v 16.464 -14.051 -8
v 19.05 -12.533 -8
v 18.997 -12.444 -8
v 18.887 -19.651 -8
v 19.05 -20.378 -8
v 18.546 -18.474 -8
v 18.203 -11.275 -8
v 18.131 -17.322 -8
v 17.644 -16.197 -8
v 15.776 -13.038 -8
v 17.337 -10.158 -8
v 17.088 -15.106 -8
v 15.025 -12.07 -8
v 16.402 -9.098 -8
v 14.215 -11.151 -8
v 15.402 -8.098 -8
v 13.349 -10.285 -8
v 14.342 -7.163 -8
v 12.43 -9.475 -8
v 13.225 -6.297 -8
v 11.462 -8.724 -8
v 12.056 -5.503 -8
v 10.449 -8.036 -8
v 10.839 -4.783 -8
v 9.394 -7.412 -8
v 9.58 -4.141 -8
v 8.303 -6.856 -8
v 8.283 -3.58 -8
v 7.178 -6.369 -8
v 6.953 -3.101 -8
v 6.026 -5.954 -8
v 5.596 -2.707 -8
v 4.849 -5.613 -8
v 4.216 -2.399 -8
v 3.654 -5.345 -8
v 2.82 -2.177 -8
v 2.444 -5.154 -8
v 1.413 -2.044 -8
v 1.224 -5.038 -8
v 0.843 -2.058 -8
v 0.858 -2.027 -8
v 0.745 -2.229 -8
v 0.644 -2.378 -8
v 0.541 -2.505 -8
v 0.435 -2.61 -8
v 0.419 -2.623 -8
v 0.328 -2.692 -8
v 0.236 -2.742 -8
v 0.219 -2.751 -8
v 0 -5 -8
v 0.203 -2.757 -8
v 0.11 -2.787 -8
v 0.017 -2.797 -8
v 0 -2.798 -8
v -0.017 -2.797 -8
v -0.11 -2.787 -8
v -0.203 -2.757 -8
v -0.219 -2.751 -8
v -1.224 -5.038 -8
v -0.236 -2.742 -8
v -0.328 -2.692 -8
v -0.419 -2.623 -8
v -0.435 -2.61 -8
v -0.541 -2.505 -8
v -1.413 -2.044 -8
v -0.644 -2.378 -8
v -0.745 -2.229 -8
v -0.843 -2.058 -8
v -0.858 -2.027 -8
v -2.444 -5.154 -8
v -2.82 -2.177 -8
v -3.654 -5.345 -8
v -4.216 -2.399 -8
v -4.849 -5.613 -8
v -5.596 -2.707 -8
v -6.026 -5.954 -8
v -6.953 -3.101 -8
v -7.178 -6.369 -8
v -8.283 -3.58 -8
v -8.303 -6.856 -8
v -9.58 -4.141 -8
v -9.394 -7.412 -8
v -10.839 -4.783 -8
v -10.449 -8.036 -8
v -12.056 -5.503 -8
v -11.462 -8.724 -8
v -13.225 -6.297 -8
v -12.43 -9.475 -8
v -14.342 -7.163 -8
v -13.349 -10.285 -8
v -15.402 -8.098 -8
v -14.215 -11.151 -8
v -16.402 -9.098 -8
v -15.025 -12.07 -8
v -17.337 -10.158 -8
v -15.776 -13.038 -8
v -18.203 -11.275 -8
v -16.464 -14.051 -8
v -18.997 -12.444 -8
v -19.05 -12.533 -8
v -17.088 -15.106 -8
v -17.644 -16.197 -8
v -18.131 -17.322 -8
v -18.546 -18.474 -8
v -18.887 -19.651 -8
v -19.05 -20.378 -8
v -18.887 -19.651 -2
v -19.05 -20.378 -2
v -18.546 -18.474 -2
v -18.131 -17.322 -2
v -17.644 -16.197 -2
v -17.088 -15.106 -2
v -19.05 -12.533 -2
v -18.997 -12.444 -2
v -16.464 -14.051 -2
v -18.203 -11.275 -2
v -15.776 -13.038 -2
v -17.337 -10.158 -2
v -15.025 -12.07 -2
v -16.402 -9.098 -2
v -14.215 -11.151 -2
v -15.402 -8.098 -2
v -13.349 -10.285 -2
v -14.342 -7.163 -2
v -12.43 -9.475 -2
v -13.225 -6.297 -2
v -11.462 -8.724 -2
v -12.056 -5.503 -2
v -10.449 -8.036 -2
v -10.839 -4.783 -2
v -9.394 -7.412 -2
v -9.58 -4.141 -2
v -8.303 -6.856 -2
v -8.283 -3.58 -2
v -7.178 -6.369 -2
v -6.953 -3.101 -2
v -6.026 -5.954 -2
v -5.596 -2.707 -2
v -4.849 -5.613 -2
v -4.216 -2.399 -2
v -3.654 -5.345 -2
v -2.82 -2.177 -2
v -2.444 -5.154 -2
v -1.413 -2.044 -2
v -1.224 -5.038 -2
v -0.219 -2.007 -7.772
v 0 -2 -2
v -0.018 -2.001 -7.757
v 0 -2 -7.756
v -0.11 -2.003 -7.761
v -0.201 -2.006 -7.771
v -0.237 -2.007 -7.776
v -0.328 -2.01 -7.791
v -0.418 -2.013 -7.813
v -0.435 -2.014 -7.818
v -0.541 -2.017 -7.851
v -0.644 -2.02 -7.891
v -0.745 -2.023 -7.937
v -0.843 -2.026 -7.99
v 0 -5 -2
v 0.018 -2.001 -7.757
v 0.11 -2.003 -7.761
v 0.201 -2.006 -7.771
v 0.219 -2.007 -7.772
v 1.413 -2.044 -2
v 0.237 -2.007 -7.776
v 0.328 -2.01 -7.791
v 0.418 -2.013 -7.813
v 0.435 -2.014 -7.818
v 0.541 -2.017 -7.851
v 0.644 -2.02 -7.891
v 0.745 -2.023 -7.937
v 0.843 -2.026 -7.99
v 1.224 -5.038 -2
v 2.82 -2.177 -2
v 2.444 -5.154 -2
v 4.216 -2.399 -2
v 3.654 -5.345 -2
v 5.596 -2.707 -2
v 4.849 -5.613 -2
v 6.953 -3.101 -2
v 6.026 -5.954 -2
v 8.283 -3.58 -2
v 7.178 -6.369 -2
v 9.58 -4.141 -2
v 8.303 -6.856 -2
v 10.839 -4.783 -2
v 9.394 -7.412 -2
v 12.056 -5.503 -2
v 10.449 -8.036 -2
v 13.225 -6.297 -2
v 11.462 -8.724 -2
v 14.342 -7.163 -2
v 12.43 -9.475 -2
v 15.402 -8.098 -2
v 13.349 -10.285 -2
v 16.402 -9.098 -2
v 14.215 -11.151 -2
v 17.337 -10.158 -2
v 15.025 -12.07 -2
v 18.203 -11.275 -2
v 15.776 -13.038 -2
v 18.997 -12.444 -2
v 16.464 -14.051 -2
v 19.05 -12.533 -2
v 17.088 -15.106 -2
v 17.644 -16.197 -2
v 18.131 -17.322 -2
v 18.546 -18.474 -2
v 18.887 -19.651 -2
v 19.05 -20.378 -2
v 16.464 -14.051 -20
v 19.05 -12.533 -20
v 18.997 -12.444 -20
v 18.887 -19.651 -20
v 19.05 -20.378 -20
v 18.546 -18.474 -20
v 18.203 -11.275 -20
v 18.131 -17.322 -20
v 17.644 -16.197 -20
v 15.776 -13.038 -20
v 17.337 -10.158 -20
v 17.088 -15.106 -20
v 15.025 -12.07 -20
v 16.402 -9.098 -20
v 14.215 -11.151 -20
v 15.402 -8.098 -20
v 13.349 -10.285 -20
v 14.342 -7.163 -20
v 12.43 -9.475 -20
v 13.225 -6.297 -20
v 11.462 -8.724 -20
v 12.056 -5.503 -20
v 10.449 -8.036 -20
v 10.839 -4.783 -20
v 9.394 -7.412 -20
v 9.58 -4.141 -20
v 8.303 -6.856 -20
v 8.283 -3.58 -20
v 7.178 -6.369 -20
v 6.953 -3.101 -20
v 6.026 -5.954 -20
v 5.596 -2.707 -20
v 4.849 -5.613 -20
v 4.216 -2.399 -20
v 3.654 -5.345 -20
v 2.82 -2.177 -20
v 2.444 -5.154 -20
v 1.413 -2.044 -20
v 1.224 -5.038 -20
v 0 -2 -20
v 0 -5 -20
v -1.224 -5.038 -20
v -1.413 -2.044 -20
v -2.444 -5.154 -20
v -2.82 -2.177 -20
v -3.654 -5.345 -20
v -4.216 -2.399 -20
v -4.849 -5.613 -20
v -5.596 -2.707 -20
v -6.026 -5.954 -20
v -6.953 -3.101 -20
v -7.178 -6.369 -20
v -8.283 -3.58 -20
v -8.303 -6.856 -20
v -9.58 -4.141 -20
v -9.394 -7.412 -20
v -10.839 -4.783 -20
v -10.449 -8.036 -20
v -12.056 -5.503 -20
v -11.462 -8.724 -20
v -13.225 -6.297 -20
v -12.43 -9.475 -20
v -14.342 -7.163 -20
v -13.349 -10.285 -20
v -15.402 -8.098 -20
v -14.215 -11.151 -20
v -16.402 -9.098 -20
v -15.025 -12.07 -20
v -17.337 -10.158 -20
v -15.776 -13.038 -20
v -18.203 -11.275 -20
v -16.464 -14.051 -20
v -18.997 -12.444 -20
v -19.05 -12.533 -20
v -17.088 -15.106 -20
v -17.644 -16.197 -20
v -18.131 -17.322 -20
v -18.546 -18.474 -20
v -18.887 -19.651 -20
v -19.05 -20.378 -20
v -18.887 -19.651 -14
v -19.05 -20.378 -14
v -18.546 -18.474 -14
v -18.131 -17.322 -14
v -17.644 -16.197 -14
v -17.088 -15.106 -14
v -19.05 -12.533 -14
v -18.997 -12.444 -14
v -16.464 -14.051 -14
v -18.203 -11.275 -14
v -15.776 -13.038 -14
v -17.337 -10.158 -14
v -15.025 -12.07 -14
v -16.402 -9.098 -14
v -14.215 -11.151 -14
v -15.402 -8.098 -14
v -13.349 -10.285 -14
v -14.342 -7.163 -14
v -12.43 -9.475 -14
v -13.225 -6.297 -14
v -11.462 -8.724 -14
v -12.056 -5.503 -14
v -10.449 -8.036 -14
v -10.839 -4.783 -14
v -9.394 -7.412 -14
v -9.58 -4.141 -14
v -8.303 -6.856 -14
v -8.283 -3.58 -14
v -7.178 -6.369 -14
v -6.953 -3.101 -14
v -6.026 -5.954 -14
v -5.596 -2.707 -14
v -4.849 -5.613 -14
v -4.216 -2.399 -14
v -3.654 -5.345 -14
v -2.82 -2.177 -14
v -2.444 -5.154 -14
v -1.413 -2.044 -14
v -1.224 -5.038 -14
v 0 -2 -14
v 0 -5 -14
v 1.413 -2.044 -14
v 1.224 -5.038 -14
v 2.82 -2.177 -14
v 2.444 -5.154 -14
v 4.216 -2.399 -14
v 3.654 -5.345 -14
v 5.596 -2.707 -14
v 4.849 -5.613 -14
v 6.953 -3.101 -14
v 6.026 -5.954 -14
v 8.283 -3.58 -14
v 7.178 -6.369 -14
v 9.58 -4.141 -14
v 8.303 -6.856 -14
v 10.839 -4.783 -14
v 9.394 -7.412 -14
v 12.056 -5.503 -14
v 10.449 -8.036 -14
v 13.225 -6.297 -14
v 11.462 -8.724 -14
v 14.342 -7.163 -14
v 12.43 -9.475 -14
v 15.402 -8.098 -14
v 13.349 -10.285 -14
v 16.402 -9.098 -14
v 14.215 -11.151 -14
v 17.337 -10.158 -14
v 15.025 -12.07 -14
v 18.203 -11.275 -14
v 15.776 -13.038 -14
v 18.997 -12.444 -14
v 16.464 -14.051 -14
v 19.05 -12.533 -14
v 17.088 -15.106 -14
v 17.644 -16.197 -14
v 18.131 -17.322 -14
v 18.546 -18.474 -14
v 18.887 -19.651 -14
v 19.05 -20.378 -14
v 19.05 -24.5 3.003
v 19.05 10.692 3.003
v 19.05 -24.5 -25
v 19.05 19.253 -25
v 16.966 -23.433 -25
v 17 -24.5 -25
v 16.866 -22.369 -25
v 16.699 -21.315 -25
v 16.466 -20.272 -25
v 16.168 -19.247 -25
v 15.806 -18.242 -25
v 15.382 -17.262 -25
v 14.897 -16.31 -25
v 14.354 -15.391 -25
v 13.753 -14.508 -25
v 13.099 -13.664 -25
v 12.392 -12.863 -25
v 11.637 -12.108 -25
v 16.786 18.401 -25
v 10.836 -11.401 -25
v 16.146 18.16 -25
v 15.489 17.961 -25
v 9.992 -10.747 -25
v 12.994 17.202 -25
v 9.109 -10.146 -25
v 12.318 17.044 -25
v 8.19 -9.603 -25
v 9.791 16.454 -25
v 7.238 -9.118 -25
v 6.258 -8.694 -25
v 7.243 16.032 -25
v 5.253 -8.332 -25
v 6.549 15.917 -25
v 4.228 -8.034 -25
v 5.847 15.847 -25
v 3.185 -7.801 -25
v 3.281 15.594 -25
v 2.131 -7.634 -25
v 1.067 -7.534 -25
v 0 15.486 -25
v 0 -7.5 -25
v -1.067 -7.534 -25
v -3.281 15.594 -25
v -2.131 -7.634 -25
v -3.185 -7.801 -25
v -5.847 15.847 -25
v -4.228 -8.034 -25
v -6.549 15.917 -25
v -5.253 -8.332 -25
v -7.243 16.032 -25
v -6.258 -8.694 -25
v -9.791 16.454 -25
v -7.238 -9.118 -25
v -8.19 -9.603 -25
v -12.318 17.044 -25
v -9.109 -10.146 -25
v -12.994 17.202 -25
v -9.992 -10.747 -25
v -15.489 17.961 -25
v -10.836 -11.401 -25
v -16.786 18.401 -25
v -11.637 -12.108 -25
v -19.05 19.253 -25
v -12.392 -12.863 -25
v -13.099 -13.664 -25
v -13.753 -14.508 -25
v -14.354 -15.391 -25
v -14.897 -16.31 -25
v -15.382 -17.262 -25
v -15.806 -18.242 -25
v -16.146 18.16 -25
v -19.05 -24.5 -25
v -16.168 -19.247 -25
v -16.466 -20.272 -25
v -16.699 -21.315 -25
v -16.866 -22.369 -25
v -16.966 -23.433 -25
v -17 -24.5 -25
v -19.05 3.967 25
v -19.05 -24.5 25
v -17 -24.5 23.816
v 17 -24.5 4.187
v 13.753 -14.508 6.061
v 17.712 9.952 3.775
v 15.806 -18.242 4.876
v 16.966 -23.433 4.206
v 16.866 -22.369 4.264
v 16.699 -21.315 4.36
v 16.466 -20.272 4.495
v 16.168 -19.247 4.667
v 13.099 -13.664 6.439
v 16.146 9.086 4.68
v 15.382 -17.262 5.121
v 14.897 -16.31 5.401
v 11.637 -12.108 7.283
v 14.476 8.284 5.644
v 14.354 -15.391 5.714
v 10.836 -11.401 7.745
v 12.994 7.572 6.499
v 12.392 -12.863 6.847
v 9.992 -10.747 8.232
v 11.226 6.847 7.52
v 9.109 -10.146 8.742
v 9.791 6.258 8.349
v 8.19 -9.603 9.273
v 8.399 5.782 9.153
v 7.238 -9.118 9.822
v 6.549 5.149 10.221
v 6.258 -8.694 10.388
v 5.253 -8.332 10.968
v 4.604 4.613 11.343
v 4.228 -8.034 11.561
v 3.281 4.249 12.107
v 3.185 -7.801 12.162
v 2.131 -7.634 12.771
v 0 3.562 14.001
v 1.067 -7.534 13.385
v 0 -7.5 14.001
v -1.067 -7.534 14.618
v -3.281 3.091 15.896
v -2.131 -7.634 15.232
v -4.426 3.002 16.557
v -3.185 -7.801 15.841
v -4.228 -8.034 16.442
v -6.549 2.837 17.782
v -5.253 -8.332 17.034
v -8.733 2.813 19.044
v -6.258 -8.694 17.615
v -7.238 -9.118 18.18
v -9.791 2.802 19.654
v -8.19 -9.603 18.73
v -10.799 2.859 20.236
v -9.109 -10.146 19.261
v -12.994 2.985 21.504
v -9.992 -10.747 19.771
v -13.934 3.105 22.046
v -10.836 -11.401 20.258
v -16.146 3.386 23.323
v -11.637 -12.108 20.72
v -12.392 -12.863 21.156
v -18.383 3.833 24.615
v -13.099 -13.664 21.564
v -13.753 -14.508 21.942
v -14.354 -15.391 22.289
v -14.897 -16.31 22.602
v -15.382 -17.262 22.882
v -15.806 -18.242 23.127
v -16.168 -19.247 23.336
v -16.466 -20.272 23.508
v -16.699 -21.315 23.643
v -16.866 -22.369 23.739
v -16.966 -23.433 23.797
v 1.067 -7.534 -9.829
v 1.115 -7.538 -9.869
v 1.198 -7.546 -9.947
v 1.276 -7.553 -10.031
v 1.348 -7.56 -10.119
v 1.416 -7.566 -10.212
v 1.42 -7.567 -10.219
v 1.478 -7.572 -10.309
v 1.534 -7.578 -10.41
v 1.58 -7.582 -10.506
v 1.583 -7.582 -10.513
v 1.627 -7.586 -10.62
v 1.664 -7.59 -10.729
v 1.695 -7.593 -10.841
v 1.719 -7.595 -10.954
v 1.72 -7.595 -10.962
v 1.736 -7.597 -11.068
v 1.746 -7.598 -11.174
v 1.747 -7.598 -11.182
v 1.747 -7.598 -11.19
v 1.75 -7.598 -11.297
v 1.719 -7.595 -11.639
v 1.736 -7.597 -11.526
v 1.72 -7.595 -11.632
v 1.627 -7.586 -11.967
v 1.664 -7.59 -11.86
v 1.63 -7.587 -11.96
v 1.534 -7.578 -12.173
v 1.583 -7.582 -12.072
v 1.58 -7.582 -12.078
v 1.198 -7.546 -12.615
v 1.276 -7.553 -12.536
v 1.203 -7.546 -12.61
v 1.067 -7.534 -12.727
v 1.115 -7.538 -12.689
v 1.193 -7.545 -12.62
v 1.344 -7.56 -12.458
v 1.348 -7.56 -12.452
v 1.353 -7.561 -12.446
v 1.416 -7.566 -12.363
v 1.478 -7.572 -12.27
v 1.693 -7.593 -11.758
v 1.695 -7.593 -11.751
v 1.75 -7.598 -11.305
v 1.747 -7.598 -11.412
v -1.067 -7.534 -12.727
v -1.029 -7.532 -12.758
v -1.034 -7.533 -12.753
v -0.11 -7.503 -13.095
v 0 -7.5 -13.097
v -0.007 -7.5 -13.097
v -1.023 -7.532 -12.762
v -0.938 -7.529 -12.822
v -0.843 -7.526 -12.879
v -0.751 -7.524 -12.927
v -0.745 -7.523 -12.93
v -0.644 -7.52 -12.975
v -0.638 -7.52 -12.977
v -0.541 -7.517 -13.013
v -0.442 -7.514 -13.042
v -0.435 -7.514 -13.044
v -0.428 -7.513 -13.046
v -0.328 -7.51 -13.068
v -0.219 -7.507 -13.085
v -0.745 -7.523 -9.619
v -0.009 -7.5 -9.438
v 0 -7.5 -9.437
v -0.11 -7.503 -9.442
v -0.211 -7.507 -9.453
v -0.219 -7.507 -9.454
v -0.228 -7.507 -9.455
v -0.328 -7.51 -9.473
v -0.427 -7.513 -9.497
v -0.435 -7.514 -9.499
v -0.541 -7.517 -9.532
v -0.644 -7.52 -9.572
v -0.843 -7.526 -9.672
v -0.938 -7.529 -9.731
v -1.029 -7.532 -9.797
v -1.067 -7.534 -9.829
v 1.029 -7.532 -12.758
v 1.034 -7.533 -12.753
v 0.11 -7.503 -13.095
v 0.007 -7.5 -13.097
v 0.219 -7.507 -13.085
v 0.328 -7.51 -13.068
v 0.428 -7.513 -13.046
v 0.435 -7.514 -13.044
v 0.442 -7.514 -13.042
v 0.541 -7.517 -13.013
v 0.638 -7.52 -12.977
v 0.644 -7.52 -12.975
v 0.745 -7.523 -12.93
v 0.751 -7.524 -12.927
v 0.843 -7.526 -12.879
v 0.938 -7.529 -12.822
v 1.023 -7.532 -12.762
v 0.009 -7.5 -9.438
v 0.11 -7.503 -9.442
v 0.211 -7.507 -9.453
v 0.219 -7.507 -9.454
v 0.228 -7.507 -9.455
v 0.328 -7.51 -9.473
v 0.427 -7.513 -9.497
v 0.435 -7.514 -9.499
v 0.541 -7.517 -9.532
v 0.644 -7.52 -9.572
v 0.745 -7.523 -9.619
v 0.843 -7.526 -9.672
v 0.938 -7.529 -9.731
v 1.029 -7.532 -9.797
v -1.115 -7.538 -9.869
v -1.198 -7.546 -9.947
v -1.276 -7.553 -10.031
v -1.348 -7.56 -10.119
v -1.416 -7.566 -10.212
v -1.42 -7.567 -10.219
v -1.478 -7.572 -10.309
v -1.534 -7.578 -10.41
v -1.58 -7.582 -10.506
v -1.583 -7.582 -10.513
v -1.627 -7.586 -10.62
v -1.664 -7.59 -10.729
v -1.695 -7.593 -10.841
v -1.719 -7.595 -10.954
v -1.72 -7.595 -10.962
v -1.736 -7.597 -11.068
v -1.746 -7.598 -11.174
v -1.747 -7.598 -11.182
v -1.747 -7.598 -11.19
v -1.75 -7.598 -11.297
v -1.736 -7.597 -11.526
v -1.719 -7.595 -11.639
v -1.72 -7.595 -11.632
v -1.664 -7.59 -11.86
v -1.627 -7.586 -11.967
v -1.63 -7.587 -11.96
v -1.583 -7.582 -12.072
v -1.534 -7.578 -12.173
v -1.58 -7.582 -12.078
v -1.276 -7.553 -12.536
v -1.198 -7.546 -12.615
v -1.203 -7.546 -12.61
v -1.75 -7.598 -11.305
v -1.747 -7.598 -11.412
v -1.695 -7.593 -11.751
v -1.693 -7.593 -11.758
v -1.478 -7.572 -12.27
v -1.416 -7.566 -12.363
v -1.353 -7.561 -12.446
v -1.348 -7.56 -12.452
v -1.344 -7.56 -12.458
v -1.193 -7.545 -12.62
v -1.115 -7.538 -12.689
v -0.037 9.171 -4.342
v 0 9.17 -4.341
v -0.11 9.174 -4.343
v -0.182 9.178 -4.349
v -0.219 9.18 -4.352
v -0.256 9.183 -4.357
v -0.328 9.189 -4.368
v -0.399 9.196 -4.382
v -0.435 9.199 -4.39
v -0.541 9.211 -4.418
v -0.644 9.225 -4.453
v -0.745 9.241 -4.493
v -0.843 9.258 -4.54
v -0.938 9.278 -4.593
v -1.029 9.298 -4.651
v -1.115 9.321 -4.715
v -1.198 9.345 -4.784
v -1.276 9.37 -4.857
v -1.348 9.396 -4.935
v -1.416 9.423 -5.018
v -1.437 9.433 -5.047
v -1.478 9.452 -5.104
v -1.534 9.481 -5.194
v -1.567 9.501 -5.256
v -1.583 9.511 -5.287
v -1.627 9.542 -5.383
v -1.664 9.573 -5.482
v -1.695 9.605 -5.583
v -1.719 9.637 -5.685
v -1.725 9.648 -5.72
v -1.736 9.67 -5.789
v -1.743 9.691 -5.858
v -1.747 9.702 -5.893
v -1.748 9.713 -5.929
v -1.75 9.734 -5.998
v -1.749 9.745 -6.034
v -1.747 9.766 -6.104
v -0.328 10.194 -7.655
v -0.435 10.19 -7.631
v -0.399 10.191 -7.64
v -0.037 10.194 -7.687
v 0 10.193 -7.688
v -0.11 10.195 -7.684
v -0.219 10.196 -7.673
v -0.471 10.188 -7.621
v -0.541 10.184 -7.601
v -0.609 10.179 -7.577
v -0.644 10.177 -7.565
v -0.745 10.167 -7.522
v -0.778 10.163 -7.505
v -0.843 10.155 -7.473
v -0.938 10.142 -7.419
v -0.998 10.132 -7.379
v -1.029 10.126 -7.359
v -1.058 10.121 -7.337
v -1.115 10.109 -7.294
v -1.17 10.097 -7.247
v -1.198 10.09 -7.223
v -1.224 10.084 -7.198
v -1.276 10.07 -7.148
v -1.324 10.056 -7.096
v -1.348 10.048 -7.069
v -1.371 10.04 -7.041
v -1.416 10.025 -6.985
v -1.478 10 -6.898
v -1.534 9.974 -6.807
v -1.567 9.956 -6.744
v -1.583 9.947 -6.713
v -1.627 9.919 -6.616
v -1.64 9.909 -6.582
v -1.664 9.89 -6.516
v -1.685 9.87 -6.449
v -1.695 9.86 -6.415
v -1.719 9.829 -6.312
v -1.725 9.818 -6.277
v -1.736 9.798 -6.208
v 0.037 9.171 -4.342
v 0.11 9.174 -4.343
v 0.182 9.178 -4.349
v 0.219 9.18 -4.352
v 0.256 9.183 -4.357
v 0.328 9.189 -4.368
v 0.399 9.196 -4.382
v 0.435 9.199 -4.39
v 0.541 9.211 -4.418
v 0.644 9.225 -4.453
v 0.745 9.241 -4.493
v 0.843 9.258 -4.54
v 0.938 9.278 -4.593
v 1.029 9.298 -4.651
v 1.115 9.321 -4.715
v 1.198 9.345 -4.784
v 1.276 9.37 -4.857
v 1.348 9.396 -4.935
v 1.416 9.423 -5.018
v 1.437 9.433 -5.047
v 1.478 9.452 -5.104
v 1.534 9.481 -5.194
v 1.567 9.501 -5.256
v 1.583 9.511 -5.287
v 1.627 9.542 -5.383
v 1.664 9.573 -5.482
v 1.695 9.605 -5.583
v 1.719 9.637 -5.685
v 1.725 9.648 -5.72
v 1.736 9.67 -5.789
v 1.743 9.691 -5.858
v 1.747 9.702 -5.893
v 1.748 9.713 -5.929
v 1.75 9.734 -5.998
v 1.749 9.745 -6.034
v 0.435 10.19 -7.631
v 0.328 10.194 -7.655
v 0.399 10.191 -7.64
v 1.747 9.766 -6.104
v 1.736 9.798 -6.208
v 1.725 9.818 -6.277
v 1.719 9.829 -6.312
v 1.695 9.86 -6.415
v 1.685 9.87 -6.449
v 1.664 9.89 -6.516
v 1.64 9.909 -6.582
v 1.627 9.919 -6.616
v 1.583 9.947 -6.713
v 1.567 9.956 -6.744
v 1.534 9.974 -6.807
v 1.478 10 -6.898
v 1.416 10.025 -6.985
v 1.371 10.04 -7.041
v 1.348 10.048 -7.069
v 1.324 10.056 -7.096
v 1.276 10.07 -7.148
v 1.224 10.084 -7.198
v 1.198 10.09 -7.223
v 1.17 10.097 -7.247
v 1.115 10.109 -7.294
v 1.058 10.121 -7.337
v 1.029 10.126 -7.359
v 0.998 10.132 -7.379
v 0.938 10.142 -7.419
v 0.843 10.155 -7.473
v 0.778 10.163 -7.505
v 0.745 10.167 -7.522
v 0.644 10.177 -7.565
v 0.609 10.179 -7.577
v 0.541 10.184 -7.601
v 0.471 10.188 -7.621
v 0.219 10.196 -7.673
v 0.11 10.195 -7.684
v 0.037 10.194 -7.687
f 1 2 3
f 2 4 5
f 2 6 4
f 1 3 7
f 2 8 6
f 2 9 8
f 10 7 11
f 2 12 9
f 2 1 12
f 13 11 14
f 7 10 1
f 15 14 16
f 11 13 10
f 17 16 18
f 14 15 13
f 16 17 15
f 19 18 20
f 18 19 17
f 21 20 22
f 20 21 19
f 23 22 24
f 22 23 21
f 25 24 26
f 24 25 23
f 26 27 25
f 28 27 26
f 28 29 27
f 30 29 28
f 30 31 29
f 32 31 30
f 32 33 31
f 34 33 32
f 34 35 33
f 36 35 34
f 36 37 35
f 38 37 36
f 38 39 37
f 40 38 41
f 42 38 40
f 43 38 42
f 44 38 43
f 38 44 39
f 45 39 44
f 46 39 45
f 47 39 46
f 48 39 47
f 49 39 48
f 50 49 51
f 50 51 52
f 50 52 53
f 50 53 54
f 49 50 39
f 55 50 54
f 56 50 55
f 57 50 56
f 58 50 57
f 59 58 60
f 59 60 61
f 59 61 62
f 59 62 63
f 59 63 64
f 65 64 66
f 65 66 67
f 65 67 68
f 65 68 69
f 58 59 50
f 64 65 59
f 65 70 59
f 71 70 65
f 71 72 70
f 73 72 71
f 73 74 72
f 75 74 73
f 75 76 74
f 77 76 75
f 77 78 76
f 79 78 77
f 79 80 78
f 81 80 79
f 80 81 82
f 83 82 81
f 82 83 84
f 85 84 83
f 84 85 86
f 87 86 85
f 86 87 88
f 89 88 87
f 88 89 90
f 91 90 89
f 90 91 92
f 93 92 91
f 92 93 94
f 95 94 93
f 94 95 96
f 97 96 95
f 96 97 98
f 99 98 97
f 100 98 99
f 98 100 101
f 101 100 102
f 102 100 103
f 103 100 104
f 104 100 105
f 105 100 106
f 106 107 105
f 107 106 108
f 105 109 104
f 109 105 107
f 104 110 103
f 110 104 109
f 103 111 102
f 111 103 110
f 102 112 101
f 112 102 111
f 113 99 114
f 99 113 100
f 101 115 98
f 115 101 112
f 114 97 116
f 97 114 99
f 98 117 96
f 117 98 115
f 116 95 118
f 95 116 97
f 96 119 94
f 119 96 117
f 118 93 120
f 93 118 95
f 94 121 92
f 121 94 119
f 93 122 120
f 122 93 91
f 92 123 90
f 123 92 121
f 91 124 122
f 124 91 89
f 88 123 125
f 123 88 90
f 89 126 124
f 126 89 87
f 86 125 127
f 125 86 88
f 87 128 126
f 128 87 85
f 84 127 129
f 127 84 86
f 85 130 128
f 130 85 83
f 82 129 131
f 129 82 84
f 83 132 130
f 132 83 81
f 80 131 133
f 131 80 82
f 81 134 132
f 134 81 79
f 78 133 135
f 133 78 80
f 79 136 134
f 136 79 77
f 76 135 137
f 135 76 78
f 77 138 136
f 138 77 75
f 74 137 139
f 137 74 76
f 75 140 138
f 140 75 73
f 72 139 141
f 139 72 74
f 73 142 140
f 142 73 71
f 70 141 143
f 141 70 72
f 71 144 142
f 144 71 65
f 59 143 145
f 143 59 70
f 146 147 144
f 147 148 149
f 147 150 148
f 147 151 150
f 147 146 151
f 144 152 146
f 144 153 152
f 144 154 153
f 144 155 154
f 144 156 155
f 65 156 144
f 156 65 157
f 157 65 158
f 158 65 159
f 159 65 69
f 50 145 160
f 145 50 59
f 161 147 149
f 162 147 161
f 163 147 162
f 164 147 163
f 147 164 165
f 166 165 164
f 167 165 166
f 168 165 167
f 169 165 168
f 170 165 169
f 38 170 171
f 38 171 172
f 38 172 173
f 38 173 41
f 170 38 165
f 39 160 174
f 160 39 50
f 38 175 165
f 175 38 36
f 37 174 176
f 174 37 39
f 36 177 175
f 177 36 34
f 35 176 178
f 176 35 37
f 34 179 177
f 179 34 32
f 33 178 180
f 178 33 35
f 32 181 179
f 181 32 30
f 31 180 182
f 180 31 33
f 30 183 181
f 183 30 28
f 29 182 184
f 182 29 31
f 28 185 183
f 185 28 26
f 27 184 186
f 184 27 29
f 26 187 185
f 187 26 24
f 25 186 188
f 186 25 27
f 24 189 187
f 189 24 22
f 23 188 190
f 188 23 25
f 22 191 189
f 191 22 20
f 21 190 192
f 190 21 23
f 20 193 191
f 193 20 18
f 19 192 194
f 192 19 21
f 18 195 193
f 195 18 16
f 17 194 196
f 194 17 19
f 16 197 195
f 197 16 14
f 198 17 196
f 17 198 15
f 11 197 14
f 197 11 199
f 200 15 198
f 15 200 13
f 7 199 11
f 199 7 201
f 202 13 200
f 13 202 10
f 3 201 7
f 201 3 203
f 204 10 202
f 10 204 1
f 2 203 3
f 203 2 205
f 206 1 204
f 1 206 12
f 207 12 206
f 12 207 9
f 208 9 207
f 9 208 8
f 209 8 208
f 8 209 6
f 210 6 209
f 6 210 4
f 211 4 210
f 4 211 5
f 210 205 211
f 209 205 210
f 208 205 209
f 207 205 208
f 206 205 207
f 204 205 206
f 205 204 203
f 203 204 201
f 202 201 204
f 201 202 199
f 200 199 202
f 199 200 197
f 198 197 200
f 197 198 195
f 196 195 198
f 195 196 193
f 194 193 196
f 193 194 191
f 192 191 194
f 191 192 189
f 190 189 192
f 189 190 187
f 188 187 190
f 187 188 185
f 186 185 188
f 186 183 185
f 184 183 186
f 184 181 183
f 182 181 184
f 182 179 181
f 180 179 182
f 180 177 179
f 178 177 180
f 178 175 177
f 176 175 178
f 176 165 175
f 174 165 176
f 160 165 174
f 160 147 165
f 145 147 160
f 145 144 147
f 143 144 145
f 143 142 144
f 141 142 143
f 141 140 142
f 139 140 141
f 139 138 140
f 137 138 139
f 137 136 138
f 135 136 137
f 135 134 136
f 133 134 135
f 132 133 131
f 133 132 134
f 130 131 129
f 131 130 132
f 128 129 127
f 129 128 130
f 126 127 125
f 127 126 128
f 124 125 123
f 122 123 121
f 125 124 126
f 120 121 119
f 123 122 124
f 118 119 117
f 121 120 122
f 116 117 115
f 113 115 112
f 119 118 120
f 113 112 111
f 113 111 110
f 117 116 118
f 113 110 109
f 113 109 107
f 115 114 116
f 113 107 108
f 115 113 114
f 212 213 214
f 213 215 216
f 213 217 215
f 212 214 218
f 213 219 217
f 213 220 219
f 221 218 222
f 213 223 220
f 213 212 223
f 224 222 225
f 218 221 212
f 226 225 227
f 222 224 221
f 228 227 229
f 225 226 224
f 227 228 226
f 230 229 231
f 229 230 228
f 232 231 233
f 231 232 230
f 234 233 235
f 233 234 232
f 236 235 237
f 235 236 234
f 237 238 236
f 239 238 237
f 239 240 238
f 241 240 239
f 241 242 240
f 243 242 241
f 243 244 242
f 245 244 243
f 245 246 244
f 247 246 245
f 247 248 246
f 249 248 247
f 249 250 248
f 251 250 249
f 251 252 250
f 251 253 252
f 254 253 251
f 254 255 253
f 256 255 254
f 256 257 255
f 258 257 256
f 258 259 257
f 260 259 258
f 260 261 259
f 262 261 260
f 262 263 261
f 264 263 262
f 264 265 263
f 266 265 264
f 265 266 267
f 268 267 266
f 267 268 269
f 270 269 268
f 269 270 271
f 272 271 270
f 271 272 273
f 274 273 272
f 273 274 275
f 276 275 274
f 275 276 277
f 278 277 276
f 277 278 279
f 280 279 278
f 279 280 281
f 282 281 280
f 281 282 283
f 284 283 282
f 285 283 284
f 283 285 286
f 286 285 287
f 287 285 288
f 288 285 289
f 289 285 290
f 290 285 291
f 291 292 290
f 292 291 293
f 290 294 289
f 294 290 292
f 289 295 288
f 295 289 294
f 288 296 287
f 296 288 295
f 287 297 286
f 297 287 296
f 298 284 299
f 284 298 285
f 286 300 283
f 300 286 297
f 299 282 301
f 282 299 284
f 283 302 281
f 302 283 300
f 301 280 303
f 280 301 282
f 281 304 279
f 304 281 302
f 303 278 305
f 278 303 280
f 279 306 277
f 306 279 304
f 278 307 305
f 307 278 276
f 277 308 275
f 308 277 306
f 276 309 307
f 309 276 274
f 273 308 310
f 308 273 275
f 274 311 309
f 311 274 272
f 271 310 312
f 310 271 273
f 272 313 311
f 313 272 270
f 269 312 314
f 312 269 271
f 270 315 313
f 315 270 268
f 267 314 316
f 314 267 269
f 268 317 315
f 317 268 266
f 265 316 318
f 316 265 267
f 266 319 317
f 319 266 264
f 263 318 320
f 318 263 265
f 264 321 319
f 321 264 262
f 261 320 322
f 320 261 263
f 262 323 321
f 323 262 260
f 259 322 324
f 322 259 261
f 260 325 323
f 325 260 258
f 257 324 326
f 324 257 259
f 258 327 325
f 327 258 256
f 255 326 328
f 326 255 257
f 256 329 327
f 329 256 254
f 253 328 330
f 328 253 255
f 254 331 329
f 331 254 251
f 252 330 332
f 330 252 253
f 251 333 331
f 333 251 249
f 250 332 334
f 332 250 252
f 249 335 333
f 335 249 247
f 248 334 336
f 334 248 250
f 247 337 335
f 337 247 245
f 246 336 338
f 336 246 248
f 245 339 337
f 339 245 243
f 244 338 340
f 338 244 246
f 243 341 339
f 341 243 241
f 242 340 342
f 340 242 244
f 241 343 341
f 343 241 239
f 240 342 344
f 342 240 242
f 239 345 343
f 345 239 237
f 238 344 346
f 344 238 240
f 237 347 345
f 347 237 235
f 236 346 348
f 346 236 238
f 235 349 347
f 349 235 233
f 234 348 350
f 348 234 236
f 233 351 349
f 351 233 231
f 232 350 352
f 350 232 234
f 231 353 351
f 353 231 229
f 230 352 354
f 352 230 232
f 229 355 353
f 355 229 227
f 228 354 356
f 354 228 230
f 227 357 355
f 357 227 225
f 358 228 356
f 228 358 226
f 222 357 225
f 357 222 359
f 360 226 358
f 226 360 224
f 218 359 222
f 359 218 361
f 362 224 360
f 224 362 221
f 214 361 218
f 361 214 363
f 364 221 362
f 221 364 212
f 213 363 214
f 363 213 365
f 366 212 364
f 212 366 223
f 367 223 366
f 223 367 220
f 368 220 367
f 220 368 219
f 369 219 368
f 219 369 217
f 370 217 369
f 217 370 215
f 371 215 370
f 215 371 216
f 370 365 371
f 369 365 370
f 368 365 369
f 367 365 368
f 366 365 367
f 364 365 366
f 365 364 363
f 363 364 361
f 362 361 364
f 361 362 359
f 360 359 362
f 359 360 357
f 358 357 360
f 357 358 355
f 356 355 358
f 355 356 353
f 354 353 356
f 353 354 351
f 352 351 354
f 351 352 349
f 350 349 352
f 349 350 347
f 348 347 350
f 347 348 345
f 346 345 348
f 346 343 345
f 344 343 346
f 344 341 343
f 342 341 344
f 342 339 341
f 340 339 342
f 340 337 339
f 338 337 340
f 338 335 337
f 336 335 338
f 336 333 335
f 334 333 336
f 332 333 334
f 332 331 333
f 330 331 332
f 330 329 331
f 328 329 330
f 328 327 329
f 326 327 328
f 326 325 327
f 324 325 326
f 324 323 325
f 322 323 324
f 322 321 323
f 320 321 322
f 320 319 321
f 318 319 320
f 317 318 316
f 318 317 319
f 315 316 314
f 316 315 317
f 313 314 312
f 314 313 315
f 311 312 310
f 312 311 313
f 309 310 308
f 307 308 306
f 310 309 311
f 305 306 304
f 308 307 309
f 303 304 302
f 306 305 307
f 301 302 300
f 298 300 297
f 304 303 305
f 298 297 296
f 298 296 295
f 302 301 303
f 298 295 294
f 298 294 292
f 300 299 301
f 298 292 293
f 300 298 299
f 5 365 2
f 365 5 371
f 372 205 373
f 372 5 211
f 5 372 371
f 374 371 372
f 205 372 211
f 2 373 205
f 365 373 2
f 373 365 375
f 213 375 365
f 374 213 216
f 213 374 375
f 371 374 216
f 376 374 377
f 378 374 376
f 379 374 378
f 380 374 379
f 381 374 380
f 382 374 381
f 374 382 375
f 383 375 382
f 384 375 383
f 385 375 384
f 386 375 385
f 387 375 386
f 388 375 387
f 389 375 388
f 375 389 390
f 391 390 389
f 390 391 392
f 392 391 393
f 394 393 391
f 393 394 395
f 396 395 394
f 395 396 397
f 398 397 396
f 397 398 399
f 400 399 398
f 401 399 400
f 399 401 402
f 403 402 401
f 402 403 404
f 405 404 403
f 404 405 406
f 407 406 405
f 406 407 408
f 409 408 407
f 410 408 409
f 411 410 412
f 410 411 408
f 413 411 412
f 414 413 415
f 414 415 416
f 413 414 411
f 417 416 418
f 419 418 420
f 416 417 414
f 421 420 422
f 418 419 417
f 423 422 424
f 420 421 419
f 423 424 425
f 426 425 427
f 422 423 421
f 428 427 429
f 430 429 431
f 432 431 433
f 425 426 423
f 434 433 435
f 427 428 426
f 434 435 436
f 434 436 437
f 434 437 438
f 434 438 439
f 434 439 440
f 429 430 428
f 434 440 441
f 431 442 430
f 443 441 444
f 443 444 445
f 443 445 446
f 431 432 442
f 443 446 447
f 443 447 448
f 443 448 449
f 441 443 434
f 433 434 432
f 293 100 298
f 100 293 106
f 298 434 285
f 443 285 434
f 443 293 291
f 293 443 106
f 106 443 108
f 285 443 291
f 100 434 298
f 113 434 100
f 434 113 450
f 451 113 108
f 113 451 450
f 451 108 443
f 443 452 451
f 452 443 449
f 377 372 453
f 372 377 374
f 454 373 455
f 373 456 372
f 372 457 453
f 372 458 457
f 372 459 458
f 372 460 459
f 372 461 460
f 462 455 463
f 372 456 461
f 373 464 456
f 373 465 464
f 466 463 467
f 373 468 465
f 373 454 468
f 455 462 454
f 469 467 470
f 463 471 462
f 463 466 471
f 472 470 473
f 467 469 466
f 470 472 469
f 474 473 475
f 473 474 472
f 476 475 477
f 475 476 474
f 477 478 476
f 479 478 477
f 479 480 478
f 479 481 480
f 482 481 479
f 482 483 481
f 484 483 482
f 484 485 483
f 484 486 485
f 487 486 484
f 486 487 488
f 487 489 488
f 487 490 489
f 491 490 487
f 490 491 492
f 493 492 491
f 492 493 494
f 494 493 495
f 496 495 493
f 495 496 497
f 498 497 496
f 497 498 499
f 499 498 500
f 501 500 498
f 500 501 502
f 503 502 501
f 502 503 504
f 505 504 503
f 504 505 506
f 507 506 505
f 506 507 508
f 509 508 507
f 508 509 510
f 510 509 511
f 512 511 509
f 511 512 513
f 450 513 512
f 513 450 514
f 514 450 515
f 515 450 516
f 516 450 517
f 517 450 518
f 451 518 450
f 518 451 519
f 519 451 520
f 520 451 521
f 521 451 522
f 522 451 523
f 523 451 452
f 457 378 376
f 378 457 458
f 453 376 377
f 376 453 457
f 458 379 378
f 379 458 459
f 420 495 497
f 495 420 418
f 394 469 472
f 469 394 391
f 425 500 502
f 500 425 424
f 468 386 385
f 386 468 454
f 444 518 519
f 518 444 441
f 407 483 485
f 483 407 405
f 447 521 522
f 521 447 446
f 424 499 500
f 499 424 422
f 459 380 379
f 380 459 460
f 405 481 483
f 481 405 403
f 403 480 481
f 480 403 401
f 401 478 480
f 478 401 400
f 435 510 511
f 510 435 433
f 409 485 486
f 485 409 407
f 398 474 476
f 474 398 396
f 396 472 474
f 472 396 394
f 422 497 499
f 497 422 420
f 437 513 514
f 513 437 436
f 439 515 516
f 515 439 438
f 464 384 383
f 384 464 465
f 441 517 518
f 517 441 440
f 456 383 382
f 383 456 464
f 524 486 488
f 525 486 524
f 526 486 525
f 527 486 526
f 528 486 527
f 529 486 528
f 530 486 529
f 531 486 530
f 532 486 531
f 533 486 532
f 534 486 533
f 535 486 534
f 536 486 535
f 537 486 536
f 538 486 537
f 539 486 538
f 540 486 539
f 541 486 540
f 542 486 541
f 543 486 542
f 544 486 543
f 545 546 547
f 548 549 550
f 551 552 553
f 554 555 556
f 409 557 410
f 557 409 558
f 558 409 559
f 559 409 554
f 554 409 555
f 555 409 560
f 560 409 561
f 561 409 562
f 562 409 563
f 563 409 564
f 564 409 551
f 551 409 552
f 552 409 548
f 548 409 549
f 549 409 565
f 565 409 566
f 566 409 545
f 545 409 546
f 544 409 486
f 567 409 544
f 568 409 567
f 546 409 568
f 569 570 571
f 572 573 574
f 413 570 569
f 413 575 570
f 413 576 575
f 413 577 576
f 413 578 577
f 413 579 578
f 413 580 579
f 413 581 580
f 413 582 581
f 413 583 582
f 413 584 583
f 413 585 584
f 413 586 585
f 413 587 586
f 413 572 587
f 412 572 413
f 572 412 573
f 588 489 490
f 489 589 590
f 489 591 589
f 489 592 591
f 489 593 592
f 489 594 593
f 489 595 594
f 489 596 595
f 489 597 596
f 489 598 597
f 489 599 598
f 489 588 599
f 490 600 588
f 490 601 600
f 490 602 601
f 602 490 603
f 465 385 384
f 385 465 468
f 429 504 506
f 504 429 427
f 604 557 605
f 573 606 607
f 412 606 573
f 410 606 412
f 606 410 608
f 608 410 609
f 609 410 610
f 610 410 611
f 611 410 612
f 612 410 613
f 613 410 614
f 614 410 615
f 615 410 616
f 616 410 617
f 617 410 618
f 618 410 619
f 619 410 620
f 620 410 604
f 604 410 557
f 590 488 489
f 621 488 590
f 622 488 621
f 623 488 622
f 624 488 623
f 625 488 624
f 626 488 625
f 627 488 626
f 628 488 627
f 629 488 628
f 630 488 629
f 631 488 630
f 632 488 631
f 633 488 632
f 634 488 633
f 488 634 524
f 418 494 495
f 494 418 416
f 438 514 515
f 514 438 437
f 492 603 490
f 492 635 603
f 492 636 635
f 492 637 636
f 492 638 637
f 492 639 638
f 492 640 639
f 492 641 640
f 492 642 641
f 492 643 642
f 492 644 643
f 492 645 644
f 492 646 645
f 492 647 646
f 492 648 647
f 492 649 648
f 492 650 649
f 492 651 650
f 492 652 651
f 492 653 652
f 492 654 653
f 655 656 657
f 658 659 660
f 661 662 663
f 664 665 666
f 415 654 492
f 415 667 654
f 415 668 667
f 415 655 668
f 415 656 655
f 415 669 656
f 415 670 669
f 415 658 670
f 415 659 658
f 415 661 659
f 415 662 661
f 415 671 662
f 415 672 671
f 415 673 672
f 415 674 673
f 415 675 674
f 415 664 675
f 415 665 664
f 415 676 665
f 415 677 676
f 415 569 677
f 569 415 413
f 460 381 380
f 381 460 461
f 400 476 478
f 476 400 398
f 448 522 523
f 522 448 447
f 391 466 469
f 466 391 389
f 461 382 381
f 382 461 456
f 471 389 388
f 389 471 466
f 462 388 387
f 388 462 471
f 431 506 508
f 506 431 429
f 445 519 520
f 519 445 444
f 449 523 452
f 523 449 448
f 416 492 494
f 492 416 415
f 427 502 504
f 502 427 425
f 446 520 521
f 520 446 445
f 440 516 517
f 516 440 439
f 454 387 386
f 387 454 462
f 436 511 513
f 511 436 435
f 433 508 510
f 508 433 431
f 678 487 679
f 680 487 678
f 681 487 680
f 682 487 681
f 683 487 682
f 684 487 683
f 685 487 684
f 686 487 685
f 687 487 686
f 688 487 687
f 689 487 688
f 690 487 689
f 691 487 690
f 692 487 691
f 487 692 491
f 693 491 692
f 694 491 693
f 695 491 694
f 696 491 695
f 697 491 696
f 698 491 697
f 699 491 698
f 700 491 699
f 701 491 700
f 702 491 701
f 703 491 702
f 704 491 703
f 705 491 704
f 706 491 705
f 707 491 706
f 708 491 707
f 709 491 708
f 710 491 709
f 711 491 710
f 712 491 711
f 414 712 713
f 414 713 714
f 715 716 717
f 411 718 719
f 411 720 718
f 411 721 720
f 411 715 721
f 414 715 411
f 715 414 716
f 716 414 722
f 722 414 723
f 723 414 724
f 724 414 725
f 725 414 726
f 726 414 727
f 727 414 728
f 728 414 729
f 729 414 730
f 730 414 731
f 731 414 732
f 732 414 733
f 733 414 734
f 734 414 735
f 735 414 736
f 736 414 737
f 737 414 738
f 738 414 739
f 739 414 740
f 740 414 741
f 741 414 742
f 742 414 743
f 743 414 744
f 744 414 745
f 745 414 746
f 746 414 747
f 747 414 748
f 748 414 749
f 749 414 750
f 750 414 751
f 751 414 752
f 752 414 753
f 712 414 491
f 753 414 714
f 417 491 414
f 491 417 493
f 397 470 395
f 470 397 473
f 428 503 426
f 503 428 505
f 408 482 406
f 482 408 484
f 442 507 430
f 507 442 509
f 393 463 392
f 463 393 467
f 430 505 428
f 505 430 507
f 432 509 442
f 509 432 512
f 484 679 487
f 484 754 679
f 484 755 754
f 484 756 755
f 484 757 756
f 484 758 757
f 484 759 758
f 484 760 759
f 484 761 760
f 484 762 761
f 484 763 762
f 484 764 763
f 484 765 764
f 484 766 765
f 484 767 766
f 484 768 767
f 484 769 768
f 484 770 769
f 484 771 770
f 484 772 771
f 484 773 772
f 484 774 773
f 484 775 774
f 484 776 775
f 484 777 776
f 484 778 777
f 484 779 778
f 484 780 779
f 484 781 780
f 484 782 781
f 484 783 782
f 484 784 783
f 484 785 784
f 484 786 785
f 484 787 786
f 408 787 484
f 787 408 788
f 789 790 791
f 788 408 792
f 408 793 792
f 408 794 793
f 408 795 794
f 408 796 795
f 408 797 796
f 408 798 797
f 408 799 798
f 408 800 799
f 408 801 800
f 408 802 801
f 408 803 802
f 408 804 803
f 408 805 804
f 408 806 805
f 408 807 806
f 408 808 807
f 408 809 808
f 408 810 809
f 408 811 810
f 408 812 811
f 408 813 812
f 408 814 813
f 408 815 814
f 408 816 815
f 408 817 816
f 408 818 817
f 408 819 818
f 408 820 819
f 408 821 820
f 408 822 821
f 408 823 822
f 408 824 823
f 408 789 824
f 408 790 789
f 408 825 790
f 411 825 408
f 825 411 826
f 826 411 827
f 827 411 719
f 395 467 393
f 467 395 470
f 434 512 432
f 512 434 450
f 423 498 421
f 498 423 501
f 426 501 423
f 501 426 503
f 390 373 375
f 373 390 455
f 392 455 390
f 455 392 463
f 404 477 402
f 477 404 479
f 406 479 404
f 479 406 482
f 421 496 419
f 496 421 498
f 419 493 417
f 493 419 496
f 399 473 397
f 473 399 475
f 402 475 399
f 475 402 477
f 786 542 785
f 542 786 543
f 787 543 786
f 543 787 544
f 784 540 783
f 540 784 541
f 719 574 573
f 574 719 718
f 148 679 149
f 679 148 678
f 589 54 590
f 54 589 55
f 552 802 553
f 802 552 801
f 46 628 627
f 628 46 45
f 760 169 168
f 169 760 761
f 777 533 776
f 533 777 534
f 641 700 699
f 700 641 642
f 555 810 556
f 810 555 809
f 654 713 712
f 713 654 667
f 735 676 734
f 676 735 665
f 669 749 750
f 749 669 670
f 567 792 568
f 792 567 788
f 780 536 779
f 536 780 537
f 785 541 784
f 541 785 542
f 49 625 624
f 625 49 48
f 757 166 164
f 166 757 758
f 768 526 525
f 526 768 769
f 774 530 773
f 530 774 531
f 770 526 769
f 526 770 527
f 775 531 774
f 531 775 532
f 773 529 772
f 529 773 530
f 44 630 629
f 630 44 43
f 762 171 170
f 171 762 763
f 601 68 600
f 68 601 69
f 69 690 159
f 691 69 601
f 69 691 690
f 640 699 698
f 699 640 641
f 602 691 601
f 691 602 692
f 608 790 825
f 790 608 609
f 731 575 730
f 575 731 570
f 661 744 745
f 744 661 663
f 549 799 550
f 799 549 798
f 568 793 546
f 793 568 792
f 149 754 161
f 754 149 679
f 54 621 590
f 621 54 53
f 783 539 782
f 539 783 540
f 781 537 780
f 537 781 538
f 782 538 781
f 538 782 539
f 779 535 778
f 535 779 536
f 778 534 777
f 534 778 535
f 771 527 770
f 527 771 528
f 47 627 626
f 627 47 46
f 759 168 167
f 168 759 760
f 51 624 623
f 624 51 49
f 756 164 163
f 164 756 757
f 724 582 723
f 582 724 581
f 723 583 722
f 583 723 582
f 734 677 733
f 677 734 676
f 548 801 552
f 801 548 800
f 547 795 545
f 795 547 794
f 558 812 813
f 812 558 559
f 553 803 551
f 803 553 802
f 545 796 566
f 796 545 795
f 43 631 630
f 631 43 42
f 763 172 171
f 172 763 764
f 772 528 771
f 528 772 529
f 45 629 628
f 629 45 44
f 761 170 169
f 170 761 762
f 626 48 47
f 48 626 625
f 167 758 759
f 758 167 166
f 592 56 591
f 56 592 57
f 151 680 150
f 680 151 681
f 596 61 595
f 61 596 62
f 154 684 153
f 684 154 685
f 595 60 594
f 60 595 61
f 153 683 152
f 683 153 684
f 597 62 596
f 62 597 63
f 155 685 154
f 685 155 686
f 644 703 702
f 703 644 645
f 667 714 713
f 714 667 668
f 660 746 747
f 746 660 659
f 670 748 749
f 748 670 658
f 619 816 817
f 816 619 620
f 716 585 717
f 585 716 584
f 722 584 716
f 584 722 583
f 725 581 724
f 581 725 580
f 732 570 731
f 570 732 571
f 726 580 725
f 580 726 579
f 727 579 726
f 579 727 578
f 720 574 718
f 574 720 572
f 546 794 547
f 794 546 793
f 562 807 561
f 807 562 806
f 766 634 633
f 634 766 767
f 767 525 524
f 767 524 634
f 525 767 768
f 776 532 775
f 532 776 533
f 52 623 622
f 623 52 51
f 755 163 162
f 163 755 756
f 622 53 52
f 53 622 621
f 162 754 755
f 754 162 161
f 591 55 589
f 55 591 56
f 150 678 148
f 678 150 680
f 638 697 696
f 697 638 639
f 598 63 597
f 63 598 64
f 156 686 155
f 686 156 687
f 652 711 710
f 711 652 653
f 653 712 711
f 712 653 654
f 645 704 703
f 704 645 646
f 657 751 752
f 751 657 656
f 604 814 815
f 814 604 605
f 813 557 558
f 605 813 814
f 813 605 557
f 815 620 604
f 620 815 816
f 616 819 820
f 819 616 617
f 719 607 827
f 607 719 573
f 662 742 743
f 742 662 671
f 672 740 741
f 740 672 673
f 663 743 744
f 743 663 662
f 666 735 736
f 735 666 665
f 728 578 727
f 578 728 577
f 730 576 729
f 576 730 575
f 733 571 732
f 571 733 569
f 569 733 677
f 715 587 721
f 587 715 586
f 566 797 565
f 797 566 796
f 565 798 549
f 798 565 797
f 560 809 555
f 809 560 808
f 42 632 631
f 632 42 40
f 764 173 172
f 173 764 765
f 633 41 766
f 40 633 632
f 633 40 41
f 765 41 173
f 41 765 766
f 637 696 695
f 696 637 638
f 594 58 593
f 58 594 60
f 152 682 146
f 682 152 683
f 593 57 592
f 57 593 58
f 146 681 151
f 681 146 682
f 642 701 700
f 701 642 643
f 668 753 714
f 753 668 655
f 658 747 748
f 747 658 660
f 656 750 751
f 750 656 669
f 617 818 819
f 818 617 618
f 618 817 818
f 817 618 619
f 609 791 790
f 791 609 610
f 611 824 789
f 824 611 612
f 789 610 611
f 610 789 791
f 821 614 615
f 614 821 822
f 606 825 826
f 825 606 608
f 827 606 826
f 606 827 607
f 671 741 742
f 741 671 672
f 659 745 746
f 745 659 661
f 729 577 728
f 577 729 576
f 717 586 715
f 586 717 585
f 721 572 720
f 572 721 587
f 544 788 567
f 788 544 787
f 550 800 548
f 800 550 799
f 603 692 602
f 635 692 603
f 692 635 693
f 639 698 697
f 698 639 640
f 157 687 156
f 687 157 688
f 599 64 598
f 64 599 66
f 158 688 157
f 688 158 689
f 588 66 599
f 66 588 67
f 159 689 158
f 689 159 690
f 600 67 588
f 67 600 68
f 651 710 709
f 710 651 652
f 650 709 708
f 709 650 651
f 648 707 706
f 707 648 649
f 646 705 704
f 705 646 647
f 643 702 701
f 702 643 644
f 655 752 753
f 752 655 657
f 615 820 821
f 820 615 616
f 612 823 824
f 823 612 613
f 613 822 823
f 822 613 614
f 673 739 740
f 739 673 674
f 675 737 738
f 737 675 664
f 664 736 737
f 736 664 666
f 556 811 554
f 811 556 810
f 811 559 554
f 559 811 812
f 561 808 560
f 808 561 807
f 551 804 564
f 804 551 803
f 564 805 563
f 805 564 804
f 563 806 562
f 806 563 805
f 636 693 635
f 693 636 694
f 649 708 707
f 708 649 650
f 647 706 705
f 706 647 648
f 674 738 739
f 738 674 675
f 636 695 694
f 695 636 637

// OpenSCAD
// metalmate aluminum crescent 8767
// 38.1 x 4.75

al_width = 38.1;
al_thick_edge = 1.0;
al_thick_center = 1.6;
al_thick_curve = 4.6;

// these should be done with maths (tm) from the
// numbers above instead of just messing around until
// they're about right.

al_radius_1 = 52.25;
al_radius_2 = 62;


seatpost_dia = 34;
seatpost_offset = 15;

// I maybe don't really need this to be so detailed but never mind ...

module extrusion(length) { 
    difference() {
        intersection() {
            translate([-al_width/2+al_thick_edge/2, -length/2, 0])
                cube([al_width-al_thick_edge, length, al_thick_curve]);
            translate([0,0,al_thick_curve-al_radius_1])
                rotate([90,0,0])
                    cylinder(r=al_radius_1,h=length,center=true, $fn=200);
        }
        translate([0,0,al_thick_curve-al_radius_2-al_thick_center])
            rotate([90,0,0])
                cylinder(r=al_radius_2, h=length+2,center=true,$fn=200);
    }
    for (x = [-1,1])
        translate([x*(al_width/2-al_thick_edge/2), 0, al_thick_edge/2*1.35])
            rotate([90,0,0])
                cylinder(d=al_thick_edge, h=length, center=true, $fn=64);        
}

$fn=100;

upper_mount_height = 50;
lower_mount_height = 10;

module upper_mount() {
    difference() {
        cube([al_width, seatpost_dia+seatpost_offset, upper_mount_height], center=true);
        translate([-al_width/2,-50,upper_mount_height/2]) rotate([0,30,0]) cube([100,100,upper_mount_height]);
        translate([0, -seatpost_offset/2-seatpost_dia/2]) cylinder (d=seatpost_dia, h=upper_mount_height*2, center=true);        
        rotate([17,0,0]) translate([0, seatpost_offset/2+al_radius_1]) cylinder(r=al_radius_1, h=upper_mount_height*2, center=true);
       for (z = [-5, -17])
        translate([0,-seatpost_offset/2-seatpost_dia/2, z])
           rotate_extrude() {
            translate([seatpost_dia/2+4,0]) square([3,6], center=true);
        }
       /*for (z = [20, 8])
           for (a = [-14, 14])
                #translate([0,al_radius_1,z]) rotate([17,0,a])
       rotate([90,0,0]) cylinder(d=3,h=al_radius_1+seatpost_offset);*/
      
     translate([0,al_radius_1,7]) rotate([107,0,0]) cylinder(d=3.5, h=al_radius_1+seatpost_offset); 
        }
}

upper_mount();
//extrusion(100);
